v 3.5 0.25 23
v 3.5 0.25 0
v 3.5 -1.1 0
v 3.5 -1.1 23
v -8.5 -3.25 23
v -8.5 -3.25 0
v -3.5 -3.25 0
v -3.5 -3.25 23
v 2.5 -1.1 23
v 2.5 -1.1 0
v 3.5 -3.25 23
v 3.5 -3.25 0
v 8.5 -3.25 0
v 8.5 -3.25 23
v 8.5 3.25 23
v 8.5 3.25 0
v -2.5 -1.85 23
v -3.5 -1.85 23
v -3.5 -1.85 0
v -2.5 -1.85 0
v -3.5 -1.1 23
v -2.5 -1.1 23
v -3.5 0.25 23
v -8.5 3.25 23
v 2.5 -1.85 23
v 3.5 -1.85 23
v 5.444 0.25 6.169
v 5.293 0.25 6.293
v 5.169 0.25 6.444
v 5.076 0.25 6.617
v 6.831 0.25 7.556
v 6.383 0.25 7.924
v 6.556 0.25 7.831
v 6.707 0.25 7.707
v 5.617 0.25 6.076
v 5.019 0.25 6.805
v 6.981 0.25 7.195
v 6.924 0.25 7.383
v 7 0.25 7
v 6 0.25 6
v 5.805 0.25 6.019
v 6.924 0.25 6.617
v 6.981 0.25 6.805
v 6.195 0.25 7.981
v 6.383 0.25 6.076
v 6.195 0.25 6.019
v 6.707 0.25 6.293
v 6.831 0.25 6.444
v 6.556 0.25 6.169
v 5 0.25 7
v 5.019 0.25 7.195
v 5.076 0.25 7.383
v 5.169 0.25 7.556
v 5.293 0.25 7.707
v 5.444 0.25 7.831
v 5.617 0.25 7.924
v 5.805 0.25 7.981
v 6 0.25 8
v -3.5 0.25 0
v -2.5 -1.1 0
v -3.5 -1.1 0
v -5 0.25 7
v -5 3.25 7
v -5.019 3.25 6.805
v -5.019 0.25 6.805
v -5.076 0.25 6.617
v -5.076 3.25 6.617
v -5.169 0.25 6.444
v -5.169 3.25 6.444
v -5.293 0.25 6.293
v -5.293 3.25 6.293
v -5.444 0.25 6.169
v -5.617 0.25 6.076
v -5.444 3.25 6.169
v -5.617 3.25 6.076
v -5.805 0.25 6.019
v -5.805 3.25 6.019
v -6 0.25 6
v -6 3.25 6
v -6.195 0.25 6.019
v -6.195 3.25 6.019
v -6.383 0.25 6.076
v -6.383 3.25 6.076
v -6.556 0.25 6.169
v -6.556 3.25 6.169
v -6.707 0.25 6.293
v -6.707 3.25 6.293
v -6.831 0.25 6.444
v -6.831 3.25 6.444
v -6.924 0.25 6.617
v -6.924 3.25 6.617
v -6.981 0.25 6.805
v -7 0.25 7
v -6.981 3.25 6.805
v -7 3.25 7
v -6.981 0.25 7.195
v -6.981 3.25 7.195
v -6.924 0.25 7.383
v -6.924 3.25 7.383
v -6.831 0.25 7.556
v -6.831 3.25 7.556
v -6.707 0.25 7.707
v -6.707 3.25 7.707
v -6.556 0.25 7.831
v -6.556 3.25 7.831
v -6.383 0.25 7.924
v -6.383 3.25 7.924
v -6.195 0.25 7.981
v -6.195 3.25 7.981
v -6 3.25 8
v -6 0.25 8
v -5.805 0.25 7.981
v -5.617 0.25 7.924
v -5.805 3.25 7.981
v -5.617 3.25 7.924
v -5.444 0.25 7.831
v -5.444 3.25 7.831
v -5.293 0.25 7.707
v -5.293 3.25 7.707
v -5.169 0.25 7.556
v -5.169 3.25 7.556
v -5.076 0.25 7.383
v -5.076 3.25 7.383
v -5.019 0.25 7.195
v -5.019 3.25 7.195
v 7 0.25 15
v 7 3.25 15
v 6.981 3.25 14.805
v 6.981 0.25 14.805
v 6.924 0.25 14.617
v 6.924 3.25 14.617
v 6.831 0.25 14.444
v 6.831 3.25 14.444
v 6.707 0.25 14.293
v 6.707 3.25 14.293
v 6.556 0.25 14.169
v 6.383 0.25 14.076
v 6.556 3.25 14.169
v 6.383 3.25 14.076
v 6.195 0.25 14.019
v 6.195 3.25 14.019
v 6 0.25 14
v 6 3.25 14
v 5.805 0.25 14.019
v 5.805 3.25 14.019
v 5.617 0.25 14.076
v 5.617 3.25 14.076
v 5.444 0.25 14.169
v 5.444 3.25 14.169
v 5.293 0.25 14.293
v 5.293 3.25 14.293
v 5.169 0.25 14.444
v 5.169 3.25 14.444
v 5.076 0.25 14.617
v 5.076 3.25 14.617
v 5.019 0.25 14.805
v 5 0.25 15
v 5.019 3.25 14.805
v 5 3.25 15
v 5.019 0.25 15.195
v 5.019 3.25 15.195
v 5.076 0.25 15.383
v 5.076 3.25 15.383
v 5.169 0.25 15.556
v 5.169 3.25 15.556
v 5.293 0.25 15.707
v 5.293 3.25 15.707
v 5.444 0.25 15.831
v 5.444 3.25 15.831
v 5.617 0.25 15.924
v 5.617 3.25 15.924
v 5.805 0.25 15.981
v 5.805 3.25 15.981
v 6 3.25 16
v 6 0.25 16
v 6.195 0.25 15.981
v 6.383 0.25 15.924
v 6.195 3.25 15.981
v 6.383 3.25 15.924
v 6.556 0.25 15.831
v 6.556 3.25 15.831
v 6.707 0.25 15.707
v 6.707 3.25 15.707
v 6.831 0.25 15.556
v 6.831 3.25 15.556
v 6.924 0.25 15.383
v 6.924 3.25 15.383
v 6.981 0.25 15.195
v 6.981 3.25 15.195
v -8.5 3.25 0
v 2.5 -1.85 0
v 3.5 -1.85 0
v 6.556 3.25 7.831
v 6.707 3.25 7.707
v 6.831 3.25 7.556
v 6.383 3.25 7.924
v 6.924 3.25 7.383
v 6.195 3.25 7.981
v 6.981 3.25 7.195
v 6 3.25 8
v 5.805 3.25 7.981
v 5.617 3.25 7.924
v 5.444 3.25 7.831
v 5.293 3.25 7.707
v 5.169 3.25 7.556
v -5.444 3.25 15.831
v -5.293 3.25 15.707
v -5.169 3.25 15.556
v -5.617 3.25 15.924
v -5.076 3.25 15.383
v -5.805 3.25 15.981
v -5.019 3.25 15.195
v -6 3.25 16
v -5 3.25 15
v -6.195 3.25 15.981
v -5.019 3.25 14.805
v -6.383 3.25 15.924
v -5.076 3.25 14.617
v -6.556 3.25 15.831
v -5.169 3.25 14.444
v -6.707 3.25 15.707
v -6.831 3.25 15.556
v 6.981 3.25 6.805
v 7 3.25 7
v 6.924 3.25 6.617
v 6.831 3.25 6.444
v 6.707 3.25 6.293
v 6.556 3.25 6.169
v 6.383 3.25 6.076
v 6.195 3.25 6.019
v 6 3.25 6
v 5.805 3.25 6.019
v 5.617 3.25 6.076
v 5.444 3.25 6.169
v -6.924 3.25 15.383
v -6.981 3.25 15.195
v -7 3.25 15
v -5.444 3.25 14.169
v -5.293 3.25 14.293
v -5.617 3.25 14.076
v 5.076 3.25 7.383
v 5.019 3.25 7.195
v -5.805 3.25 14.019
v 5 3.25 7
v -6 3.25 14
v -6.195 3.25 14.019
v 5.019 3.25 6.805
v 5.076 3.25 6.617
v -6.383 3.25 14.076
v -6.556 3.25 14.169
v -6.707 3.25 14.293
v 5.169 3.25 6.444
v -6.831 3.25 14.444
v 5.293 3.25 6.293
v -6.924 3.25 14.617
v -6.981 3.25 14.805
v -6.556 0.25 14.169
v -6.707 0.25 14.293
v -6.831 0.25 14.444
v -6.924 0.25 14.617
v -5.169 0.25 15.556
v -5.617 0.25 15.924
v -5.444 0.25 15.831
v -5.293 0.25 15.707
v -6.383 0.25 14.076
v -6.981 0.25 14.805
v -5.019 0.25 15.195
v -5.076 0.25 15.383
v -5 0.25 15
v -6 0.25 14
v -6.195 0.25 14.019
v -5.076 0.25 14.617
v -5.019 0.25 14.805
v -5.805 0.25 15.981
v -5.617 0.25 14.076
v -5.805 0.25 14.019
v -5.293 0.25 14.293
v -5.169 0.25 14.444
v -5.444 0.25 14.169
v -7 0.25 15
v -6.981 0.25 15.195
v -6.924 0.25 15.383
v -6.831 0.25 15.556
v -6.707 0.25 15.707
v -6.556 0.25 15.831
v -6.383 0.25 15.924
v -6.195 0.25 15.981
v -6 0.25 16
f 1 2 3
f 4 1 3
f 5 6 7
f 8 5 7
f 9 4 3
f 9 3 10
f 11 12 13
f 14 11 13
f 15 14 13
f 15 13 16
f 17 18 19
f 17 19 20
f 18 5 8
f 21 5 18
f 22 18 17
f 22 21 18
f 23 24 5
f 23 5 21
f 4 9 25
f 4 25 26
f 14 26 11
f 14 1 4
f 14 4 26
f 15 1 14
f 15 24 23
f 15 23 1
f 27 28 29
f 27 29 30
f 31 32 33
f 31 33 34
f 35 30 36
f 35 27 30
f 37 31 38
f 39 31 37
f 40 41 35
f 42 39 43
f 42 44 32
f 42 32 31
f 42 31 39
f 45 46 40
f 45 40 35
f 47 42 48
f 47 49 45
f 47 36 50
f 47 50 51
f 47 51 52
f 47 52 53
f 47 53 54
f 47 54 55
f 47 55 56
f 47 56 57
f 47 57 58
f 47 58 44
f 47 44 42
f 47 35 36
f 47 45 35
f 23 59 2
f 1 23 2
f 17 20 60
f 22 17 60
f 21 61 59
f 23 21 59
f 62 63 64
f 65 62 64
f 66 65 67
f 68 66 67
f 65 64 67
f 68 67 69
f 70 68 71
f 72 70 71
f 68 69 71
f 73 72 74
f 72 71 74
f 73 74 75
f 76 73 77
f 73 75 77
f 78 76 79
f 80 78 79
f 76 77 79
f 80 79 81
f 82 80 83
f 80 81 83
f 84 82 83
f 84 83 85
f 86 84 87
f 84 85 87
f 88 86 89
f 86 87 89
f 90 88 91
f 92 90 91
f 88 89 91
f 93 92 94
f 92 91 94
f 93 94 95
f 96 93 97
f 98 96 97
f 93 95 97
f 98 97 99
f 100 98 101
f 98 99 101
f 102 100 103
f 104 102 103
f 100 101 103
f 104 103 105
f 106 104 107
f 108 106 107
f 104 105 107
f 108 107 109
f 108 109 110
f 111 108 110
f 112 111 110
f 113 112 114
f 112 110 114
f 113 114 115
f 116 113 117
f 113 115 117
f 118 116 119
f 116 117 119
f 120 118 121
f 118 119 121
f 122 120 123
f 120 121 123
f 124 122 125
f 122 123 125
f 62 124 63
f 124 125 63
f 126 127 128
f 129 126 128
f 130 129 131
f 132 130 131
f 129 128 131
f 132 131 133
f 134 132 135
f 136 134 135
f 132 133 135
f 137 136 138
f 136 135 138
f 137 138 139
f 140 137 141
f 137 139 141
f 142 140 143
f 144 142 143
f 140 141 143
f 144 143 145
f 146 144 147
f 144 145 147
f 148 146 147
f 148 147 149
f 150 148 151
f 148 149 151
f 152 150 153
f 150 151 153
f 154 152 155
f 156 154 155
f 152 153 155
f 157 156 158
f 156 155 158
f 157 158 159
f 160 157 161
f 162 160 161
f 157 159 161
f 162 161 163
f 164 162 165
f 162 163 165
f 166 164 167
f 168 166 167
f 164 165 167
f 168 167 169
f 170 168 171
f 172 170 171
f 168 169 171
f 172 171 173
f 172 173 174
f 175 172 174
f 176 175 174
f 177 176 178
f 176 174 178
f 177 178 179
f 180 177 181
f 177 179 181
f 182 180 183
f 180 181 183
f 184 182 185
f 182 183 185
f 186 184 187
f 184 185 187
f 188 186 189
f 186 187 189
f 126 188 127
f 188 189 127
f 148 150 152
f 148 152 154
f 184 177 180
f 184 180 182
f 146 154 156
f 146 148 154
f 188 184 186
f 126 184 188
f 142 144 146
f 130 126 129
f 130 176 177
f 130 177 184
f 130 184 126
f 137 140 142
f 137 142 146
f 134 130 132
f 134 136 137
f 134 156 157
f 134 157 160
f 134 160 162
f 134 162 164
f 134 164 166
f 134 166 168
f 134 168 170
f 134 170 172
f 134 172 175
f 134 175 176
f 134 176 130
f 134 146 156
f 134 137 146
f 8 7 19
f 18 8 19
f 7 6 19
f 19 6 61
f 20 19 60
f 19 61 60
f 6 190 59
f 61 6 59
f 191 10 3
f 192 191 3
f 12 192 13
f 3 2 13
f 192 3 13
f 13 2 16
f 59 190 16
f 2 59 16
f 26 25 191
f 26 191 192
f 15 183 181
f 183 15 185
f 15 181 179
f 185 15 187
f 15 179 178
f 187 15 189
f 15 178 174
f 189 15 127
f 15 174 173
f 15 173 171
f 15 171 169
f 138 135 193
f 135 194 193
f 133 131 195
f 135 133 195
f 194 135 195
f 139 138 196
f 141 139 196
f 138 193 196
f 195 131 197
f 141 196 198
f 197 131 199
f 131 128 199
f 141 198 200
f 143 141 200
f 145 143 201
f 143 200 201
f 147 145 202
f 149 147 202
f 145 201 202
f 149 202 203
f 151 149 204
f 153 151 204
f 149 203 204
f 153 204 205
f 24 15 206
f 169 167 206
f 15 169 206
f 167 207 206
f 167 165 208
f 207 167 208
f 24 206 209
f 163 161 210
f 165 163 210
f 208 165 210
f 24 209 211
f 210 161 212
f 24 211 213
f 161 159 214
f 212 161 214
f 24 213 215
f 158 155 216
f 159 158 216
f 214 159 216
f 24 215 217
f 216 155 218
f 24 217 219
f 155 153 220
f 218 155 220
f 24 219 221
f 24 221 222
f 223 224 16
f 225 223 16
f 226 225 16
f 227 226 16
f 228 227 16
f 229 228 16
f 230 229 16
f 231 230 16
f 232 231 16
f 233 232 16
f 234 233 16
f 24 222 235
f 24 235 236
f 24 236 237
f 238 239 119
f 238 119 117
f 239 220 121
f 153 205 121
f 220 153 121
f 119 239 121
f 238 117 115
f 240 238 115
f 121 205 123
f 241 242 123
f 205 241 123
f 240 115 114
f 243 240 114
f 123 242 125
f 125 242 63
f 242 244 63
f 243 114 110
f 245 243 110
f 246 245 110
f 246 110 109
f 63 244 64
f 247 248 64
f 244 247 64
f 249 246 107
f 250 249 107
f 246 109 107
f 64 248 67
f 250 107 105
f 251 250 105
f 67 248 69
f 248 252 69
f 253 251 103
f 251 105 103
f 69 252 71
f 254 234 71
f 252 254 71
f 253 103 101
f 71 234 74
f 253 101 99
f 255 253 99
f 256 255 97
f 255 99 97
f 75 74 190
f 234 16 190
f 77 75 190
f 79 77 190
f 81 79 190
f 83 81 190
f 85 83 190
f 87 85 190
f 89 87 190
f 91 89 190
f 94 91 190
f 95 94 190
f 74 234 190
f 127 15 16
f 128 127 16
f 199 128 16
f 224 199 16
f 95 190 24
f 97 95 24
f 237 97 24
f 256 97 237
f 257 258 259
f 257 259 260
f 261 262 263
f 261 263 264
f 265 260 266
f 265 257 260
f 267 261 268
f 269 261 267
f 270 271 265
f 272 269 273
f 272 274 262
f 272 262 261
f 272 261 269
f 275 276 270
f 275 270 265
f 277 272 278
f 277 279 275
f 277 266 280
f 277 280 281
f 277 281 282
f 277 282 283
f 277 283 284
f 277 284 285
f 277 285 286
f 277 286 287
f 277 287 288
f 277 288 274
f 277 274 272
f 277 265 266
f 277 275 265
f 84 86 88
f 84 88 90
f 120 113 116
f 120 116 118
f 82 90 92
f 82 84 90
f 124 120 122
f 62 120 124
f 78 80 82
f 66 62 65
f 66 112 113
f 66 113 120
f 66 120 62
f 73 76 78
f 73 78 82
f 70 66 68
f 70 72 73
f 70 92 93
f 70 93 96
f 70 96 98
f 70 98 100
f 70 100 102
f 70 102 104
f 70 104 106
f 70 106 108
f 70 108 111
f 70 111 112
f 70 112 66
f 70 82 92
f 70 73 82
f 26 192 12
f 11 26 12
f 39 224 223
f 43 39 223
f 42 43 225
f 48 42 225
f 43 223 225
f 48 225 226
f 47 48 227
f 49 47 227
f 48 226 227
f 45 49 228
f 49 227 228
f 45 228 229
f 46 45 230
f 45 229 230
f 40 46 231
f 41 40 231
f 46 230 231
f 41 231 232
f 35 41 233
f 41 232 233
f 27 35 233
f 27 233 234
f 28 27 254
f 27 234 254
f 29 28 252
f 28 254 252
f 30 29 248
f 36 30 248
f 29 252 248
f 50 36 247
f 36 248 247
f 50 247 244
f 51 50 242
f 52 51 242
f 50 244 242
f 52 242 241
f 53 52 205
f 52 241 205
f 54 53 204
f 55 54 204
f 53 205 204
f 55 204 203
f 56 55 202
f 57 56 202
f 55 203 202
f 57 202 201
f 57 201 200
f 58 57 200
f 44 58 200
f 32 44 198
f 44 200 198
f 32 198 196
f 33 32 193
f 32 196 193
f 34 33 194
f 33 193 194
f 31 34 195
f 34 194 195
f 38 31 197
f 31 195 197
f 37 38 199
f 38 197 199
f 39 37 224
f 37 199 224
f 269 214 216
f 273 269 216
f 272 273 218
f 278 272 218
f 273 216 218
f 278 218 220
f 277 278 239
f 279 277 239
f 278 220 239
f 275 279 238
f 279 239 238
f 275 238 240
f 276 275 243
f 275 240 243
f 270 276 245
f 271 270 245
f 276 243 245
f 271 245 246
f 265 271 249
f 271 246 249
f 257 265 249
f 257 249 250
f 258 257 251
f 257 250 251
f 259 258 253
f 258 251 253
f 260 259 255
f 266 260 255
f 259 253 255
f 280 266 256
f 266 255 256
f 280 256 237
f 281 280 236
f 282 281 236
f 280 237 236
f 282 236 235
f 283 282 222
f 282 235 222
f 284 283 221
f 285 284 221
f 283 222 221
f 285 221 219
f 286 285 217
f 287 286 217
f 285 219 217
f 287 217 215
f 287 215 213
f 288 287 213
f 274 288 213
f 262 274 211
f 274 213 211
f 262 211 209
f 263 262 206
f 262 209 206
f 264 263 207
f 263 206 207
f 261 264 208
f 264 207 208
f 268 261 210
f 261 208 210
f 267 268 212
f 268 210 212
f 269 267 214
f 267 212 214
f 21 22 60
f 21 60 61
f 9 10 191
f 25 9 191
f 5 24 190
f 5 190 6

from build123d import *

# Parameters (mm, degrees)
EXTRUDE_1_DEPTH     = 23
CUT_EXTRUDE_START   = 3.25
SKETCH_2_R          = 1
CUT_EXTRUDE_1_DEPTH = 3


with BuildPart() as part:
    # 草图1 → 凸台-拉伸1 (new body)
    with BuildSketch(Plane.XY):
        Polygon((3.5, -1.85), (3.5, -3.25), (8.5, -3.25), (8.5, 3.25), (-8.5, 3.25), (-8.5, -3.25), (-3.5, -3.25), (-3.5, -1.85), (-2.5, -1.85), (-2.5, -1.1), (-3.5, -1.1), (-3.5, 0.25), (3.5, 0.25), (3.5, -1.1), (2.5, -1.1), (2.5, -1.85), align=None)
    extrude(amount=EXTRUDE_1_DEPTH)

    # 草图2 → 切除-拉伸1 (cut)
    with BuildSketch(Plane(origin=(0, 0, 0), x_dir=(1, 0, 0), z_dir=(0, 1, 0)).offset(CUT_EXTRUDE_START)):
        with Locations((-6, -7)):
            Circle(SKETCH_2_R)
        with Locations((6, -7)):
            Circle(SKETCH_2_R)
        with Locations((-6, -15)):
            Circle(SKETCH_2_R)
        with Locations((6, -15)):
            Circle(SKETCH_2_R)
    extrude(amount=-CUT_EXTRUDE_1_DEPTH, mode=Mode.SUBTRACT)


solid = part.part
